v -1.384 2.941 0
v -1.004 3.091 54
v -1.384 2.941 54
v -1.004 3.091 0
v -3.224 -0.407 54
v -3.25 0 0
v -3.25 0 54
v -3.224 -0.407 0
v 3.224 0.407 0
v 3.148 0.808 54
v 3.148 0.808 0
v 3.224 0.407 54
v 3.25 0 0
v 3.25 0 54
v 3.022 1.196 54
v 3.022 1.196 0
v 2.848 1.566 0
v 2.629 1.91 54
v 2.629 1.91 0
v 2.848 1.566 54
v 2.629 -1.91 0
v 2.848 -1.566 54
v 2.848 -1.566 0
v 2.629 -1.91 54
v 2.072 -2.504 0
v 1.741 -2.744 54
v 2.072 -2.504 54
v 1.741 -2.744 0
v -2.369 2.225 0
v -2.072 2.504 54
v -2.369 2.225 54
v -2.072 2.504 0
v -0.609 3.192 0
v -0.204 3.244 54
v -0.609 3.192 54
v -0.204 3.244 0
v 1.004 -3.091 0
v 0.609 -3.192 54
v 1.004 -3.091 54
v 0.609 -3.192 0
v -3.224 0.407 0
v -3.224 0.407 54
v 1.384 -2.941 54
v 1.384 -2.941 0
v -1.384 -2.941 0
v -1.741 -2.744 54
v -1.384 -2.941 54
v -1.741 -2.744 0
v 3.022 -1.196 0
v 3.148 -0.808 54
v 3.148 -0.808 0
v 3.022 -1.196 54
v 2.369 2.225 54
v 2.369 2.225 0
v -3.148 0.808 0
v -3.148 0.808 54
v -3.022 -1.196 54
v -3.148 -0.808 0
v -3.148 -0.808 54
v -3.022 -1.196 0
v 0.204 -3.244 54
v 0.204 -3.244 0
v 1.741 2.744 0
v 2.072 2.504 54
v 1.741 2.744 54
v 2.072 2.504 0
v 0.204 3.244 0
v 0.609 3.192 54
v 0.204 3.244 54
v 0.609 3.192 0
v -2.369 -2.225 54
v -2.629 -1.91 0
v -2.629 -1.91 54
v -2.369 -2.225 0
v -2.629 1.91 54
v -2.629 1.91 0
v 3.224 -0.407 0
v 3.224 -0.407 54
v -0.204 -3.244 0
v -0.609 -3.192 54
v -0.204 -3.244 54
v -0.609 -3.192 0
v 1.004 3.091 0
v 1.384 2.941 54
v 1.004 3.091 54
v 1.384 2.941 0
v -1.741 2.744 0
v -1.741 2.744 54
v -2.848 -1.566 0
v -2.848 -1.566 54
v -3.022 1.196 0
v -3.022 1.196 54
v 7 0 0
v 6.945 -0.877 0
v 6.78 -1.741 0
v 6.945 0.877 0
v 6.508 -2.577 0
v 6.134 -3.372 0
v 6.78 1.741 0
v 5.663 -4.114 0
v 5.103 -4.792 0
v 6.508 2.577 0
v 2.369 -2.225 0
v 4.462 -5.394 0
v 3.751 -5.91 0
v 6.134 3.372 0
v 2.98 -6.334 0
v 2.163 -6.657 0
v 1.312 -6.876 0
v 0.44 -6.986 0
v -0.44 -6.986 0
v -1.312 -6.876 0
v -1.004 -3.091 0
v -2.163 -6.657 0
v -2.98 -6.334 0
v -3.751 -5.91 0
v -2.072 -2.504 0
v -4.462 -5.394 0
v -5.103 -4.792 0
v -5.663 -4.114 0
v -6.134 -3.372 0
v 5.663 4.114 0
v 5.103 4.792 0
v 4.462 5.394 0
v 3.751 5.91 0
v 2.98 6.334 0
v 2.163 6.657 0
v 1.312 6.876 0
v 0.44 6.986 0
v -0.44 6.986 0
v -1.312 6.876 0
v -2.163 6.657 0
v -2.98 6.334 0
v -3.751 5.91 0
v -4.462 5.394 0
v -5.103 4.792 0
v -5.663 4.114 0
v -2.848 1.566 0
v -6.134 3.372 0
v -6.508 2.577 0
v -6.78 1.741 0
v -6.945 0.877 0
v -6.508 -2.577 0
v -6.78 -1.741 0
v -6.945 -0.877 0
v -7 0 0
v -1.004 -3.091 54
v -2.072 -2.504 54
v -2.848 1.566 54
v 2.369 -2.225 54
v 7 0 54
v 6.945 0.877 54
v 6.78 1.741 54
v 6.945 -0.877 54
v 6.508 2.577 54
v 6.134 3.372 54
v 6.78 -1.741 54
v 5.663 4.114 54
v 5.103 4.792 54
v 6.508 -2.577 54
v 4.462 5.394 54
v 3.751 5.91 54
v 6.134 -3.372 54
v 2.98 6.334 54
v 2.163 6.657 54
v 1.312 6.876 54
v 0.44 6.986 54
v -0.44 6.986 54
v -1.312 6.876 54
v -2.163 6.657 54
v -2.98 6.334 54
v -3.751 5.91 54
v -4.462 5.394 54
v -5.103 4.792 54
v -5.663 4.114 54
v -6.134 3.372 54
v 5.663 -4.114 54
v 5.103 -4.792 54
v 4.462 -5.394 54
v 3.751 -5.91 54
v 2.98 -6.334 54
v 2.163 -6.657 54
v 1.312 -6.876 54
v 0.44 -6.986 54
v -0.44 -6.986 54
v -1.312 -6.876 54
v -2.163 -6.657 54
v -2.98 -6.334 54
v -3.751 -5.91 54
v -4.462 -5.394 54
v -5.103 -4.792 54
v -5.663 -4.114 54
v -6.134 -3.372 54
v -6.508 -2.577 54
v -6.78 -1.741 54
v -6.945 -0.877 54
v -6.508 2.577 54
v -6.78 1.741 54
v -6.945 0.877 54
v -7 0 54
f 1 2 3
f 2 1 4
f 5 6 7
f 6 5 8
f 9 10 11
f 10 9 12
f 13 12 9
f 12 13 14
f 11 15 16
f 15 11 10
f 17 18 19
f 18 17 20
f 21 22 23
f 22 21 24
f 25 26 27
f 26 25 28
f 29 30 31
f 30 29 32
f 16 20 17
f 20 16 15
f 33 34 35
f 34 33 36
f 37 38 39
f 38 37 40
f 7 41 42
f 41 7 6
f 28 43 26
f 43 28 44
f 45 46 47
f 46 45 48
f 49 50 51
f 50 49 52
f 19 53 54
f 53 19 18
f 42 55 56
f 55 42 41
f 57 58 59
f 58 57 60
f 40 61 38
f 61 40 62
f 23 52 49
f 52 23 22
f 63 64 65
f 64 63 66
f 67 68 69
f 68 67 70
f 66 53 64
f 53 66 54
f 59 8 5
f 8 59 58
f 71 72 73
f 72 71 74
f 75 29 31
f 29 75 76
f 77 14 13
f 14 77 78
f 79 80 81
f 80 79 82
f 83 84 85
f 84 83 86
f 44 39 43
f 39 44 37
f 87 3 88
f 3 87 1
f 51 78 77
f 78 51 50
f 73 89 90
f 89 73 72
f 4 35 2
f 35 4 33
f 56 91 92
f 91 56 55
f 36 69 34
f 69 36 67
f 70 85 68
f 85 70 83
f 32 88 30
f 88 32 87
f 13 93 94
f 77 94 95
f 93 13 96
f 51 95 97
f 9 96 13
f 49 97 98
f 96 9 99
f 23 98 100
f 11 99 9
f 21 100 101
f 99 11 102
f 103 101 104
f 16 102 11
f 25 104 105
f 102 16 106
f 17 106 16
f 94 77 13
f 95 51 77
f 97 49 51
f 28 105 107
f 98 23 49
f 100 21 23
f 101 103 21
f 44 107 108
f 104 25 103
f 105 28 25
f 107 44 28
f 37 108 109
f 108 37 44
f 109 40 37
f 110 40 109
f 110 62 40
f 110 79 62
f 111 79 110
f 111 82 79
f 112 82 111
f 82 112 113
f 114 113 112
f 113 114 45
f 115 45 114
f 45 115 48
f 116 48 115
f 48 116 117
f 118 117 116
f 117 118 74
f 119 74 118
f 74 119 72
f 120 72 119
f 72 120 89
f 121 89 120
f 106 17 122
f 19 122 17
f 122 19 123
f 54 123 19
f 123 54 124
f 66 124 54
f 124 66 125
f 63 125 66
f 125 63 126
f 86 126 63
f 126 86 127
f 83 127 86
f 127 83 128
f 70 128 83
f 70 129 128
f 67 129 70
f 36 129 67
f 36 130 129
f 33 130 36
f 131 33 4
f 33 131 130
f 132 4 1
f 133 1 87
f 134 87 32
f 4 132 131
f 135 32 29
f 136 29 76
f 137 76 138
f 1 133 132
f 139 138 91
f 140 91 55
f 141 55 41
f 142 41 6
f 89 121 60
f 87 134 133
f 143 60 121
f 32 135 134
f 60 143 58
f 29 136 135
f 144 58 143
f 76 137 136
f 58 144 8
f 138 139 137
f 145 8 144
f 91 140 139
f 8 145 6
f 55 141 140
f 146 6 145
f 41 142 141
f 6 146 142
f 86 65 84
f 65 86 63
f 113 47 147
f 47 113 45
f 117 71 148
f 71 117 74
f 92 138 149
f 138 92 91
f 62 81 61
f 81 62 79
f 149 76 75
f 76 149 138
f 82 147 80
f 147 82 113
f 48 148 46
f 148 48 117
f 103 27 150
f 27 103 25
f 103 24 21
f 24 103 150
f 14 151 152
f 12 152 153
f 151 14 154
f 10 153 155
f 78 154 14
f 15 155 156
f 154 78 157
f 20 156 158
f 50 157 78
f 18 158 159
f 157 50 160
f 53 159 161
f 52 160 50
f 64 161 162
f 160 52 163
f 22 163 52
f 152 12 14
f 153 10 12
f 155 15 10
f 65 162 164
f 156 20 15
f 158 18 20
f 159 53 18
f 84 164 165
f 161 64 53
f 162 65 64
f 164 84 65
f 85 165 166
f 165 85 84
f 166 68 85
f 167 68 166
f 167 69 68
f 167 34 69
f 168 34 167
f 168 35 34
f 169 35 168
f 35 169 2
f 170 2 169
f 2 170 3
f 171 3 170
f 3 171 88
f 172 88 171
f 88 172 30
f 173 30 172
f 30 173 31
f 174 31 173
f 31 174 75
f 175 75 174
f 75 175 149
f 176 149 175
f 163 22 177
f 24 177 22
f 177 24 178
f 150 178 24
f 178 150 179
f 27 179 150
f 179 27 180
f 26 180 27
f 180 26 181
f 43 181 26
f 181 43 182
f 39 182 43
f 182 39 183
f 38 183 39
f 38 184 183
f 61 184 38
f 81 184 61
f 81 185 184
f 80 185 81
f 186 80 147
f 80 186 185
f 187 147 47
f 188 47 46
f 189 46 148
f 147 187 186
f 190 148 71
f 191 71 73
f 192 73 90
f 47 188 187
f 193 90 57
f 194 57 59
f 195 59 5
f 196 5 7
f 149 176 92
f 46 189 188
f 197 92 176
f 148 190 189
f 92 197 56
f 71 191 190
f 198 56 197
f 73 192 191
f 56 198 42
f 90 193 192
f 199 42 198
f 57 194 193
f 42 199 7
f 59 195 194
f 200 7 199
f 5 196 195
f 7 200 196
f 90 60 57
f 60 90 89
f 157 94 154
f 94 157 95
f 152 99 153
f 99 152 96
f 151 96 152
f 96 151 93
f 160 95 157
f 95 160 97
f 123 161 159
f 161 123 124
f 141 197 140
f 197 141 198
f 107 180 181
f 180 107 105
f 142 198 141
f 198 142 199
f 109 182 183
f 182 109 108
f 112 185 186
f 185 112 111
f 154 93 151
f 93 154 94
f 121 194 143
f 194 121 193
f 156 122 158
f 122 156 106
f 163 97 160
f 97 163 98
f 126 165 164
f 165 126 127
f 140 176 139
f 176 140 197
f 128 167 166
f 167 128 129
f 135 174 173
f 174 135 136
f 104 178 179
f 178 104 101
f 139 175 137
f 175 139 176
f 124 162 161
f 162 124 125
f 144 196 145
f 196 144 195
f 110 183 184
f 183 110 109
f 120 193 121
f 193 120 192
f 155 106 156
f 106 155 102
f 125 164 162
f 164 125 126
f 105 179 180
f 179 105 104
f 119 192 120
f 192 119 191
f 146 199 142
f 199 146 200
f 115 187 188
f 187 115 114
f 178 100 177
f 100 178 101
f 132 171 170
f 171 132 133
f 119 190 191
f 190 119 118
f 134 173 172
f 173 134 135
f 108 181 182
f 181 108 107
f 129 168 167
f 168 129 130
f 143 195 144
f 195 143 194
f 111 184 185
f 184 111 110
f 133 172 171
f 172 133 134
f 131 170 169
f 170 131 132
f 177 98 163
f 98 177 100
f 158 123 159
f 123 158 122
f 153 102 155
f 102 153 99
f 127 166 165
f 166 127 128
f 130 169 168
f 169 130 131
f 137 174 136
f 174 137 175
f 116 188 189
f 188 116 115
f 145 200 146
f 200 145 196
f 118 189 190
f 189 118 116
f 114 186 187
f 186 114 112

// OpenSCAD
$fn = 50;


difference() {
	union() {
		cylinder(h = 54, r = 7.0000000000);
	}
	union() {
		cylinder(h = 54, r = 3.2500000000);
		cylinder(h = 54, r = 1.8000000000);
		cylinder(h = 54, r = 1.8000000000);
		cylinder(h = 54, r = 1.8000000000);
	}
}
